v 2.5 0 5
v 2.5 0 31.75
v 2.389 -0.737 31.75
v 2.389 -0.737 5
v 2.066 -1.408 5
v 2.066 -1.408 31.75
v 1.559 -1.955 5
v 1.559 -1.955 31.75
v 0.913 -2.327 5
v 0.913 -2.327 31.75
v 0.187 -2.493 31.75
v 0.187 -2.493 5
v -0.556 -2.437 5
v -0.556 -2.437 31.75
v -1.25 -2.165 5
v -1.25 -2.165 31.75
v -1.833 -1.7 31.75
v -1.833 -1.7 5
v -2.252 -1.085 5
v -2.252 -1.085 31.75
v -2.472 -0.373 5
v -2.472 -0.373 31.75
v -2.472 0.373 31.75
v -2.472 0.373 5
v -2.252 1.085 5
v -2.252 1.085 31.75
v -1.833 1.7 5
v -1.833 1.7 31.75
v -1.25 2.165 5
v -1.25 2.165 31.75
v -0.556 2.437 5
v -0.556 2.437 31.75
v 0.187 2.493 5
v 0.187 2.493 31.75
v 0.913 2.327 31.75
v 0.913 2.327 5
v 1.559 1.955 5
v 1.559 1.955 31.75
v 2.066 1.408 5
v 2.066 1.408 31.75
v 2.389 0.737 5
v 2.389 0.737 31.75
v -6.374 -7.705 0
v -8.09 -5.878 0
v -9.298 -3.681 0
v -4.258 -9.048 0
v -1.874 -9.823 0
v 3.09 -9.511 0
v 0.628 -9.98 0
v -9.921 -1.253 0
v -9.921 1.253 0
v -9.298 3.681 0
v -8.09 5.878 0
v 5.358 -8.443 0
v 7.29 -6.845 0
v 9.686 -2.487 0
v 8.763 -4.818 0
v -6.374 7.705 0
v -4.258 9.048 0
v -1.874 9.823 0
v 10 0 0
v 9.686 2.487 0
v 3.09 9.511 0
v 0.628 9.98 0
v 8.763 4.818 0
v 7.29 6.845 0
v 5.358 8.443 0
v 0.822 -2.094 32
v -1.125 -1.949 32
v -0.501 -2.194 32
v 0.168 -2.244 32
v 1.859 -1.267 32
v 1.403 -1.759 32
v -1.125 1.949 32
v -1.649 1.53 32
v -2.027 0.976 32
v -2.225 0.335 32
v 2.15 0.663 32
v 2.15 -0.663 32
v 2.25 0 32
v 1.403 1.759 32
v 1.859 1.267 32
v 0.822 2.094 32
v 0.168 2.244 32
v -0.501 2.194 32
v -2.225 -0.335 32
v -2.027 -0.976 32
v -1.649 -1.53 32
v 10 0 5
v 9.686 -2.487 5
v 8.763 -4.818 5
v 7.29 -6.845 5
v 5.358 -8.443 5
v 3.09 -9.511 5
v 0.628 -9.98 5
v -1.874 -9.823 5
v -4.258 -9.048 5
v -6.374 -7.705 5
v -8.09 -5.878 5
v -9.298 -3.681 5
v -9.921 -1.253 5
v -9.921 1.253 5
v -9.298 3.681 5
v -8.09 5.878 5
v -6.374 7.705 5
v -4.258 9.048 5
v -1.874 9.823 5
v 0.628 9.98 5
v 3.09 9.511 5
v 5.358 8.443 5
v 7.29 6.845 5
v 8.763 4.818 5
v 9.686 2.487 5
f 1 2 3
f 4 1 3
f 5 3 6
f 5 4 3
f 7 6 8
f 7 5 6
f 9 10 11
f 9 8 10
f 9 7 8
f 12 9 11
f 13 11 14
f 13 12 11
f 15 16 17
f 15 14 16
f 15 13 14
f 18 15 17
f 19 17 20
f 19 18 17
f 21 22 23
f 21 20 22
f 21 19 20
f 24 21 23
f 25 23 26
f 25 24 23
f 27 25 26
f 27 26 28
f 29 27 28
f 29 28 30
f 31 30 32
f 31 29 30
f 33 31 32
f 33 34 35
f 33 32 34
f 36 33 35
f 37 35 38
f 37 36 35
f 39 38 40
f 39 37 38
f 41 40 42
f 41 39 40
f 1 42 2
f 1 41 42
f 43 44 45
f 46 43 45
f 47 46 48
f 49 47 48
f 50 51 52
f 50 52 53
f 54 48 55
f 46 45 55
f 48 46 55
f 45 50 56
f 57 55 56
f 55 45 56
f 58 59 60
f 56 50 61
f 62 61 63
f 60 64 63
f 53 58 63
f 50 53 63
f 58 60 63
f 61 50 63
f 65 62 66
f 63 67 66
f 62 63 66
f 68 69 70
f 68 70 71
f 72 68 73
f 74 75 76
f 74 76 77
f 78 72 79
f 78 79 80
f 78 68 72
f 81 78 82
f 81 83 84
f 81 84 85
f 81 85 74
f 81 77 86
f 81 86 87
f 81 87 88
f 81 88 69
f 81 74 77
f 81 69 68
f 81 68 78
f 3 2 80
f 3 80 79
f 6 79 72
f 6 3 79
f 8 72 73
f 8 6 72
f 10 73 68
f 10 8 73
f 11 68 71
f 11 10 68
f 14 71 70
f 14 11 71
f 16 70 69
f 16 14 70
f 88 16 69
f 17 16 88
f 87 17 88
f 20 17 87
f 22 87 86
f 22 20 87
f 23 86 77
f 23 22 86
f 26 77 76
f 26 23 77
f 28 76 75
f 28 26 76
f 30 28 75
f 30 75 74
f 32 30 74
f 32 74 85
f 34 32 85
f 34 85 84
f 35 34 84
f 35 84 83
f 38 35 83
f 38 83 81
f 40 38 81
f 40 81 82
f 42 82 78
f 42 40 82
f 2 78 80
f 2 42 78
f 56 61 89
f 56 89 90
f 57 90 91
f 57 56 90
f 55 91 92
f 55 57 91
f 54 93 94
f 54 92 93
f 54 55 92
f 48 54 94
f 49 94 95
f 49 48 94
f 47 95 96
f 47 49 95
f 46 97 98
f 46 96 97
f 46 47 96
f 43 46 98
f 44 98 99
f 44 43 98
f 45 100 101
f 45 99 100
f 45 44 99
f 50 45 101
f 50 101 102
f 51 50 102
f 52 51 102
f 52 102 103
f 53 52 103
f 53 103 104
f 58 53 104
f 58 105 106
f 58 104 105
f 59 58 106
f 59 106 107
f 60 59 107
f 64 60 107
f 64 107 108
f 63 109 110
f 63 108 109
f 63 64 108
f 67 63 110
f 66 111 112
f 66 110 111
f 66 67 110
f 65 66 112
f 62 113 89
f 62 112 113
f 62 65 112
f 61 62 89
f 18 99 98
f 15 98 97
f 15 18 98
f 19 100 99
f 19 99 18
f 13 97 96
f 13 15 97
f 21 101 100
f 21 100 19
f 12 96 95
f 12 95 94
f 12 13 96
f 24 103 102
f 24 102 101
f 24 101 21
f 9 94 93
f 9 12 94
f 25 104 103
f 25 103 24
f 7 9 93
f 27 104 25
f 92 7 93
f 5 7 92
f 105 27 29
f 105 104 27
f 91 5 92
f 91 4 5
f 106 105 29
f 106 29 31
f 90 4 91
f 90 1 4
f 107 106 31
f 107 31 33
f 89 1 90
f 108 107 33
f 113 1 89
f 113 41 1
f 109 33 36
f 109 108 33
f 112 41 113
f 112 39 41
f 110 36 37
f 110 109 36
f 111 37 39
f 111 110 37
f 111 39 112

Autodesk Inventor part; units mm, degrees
ref_plane "YZ Plane" through (0, 0, 0) normal (1, 0, 0) x (0, 1, 0)
ref_plane "XZ Plane" through (0, 0, 0) normal (0, 1, 0) x (-1, 0, 0)
ref_plane "XY Plane" through (0, 0, 0) normal (0, 0, 1) x (1, 0, 0)
sketch "草图1" plane through (0, 0, 0) normal (0, 0, 1) x (1, 0, 0)
  circle A0 centre (0, 0) radius 10
  dimension "d0" = 20
extrude "拉伸1" add sketch "草图1" along normal blind 5
sketch "草图2" plane through (0, 0, 5) normal (0, 0, 1) x (1, 0, 0)
  circle A0 centre (0, 0) radius 2.5
  dimension "d3" = 5
extrude "拉伸2" add sketch "草图2" along normal blind 27
thread "螺纹1" size "M5x0.8" class "6g" standard "ANSI Metric M Profile" full length
chamfer "倒角1" distance 0.25 angle 45 1 edges at (-2.5, 0, 32)
properties part number "刀轴带动盘连杆固定螺丝"
